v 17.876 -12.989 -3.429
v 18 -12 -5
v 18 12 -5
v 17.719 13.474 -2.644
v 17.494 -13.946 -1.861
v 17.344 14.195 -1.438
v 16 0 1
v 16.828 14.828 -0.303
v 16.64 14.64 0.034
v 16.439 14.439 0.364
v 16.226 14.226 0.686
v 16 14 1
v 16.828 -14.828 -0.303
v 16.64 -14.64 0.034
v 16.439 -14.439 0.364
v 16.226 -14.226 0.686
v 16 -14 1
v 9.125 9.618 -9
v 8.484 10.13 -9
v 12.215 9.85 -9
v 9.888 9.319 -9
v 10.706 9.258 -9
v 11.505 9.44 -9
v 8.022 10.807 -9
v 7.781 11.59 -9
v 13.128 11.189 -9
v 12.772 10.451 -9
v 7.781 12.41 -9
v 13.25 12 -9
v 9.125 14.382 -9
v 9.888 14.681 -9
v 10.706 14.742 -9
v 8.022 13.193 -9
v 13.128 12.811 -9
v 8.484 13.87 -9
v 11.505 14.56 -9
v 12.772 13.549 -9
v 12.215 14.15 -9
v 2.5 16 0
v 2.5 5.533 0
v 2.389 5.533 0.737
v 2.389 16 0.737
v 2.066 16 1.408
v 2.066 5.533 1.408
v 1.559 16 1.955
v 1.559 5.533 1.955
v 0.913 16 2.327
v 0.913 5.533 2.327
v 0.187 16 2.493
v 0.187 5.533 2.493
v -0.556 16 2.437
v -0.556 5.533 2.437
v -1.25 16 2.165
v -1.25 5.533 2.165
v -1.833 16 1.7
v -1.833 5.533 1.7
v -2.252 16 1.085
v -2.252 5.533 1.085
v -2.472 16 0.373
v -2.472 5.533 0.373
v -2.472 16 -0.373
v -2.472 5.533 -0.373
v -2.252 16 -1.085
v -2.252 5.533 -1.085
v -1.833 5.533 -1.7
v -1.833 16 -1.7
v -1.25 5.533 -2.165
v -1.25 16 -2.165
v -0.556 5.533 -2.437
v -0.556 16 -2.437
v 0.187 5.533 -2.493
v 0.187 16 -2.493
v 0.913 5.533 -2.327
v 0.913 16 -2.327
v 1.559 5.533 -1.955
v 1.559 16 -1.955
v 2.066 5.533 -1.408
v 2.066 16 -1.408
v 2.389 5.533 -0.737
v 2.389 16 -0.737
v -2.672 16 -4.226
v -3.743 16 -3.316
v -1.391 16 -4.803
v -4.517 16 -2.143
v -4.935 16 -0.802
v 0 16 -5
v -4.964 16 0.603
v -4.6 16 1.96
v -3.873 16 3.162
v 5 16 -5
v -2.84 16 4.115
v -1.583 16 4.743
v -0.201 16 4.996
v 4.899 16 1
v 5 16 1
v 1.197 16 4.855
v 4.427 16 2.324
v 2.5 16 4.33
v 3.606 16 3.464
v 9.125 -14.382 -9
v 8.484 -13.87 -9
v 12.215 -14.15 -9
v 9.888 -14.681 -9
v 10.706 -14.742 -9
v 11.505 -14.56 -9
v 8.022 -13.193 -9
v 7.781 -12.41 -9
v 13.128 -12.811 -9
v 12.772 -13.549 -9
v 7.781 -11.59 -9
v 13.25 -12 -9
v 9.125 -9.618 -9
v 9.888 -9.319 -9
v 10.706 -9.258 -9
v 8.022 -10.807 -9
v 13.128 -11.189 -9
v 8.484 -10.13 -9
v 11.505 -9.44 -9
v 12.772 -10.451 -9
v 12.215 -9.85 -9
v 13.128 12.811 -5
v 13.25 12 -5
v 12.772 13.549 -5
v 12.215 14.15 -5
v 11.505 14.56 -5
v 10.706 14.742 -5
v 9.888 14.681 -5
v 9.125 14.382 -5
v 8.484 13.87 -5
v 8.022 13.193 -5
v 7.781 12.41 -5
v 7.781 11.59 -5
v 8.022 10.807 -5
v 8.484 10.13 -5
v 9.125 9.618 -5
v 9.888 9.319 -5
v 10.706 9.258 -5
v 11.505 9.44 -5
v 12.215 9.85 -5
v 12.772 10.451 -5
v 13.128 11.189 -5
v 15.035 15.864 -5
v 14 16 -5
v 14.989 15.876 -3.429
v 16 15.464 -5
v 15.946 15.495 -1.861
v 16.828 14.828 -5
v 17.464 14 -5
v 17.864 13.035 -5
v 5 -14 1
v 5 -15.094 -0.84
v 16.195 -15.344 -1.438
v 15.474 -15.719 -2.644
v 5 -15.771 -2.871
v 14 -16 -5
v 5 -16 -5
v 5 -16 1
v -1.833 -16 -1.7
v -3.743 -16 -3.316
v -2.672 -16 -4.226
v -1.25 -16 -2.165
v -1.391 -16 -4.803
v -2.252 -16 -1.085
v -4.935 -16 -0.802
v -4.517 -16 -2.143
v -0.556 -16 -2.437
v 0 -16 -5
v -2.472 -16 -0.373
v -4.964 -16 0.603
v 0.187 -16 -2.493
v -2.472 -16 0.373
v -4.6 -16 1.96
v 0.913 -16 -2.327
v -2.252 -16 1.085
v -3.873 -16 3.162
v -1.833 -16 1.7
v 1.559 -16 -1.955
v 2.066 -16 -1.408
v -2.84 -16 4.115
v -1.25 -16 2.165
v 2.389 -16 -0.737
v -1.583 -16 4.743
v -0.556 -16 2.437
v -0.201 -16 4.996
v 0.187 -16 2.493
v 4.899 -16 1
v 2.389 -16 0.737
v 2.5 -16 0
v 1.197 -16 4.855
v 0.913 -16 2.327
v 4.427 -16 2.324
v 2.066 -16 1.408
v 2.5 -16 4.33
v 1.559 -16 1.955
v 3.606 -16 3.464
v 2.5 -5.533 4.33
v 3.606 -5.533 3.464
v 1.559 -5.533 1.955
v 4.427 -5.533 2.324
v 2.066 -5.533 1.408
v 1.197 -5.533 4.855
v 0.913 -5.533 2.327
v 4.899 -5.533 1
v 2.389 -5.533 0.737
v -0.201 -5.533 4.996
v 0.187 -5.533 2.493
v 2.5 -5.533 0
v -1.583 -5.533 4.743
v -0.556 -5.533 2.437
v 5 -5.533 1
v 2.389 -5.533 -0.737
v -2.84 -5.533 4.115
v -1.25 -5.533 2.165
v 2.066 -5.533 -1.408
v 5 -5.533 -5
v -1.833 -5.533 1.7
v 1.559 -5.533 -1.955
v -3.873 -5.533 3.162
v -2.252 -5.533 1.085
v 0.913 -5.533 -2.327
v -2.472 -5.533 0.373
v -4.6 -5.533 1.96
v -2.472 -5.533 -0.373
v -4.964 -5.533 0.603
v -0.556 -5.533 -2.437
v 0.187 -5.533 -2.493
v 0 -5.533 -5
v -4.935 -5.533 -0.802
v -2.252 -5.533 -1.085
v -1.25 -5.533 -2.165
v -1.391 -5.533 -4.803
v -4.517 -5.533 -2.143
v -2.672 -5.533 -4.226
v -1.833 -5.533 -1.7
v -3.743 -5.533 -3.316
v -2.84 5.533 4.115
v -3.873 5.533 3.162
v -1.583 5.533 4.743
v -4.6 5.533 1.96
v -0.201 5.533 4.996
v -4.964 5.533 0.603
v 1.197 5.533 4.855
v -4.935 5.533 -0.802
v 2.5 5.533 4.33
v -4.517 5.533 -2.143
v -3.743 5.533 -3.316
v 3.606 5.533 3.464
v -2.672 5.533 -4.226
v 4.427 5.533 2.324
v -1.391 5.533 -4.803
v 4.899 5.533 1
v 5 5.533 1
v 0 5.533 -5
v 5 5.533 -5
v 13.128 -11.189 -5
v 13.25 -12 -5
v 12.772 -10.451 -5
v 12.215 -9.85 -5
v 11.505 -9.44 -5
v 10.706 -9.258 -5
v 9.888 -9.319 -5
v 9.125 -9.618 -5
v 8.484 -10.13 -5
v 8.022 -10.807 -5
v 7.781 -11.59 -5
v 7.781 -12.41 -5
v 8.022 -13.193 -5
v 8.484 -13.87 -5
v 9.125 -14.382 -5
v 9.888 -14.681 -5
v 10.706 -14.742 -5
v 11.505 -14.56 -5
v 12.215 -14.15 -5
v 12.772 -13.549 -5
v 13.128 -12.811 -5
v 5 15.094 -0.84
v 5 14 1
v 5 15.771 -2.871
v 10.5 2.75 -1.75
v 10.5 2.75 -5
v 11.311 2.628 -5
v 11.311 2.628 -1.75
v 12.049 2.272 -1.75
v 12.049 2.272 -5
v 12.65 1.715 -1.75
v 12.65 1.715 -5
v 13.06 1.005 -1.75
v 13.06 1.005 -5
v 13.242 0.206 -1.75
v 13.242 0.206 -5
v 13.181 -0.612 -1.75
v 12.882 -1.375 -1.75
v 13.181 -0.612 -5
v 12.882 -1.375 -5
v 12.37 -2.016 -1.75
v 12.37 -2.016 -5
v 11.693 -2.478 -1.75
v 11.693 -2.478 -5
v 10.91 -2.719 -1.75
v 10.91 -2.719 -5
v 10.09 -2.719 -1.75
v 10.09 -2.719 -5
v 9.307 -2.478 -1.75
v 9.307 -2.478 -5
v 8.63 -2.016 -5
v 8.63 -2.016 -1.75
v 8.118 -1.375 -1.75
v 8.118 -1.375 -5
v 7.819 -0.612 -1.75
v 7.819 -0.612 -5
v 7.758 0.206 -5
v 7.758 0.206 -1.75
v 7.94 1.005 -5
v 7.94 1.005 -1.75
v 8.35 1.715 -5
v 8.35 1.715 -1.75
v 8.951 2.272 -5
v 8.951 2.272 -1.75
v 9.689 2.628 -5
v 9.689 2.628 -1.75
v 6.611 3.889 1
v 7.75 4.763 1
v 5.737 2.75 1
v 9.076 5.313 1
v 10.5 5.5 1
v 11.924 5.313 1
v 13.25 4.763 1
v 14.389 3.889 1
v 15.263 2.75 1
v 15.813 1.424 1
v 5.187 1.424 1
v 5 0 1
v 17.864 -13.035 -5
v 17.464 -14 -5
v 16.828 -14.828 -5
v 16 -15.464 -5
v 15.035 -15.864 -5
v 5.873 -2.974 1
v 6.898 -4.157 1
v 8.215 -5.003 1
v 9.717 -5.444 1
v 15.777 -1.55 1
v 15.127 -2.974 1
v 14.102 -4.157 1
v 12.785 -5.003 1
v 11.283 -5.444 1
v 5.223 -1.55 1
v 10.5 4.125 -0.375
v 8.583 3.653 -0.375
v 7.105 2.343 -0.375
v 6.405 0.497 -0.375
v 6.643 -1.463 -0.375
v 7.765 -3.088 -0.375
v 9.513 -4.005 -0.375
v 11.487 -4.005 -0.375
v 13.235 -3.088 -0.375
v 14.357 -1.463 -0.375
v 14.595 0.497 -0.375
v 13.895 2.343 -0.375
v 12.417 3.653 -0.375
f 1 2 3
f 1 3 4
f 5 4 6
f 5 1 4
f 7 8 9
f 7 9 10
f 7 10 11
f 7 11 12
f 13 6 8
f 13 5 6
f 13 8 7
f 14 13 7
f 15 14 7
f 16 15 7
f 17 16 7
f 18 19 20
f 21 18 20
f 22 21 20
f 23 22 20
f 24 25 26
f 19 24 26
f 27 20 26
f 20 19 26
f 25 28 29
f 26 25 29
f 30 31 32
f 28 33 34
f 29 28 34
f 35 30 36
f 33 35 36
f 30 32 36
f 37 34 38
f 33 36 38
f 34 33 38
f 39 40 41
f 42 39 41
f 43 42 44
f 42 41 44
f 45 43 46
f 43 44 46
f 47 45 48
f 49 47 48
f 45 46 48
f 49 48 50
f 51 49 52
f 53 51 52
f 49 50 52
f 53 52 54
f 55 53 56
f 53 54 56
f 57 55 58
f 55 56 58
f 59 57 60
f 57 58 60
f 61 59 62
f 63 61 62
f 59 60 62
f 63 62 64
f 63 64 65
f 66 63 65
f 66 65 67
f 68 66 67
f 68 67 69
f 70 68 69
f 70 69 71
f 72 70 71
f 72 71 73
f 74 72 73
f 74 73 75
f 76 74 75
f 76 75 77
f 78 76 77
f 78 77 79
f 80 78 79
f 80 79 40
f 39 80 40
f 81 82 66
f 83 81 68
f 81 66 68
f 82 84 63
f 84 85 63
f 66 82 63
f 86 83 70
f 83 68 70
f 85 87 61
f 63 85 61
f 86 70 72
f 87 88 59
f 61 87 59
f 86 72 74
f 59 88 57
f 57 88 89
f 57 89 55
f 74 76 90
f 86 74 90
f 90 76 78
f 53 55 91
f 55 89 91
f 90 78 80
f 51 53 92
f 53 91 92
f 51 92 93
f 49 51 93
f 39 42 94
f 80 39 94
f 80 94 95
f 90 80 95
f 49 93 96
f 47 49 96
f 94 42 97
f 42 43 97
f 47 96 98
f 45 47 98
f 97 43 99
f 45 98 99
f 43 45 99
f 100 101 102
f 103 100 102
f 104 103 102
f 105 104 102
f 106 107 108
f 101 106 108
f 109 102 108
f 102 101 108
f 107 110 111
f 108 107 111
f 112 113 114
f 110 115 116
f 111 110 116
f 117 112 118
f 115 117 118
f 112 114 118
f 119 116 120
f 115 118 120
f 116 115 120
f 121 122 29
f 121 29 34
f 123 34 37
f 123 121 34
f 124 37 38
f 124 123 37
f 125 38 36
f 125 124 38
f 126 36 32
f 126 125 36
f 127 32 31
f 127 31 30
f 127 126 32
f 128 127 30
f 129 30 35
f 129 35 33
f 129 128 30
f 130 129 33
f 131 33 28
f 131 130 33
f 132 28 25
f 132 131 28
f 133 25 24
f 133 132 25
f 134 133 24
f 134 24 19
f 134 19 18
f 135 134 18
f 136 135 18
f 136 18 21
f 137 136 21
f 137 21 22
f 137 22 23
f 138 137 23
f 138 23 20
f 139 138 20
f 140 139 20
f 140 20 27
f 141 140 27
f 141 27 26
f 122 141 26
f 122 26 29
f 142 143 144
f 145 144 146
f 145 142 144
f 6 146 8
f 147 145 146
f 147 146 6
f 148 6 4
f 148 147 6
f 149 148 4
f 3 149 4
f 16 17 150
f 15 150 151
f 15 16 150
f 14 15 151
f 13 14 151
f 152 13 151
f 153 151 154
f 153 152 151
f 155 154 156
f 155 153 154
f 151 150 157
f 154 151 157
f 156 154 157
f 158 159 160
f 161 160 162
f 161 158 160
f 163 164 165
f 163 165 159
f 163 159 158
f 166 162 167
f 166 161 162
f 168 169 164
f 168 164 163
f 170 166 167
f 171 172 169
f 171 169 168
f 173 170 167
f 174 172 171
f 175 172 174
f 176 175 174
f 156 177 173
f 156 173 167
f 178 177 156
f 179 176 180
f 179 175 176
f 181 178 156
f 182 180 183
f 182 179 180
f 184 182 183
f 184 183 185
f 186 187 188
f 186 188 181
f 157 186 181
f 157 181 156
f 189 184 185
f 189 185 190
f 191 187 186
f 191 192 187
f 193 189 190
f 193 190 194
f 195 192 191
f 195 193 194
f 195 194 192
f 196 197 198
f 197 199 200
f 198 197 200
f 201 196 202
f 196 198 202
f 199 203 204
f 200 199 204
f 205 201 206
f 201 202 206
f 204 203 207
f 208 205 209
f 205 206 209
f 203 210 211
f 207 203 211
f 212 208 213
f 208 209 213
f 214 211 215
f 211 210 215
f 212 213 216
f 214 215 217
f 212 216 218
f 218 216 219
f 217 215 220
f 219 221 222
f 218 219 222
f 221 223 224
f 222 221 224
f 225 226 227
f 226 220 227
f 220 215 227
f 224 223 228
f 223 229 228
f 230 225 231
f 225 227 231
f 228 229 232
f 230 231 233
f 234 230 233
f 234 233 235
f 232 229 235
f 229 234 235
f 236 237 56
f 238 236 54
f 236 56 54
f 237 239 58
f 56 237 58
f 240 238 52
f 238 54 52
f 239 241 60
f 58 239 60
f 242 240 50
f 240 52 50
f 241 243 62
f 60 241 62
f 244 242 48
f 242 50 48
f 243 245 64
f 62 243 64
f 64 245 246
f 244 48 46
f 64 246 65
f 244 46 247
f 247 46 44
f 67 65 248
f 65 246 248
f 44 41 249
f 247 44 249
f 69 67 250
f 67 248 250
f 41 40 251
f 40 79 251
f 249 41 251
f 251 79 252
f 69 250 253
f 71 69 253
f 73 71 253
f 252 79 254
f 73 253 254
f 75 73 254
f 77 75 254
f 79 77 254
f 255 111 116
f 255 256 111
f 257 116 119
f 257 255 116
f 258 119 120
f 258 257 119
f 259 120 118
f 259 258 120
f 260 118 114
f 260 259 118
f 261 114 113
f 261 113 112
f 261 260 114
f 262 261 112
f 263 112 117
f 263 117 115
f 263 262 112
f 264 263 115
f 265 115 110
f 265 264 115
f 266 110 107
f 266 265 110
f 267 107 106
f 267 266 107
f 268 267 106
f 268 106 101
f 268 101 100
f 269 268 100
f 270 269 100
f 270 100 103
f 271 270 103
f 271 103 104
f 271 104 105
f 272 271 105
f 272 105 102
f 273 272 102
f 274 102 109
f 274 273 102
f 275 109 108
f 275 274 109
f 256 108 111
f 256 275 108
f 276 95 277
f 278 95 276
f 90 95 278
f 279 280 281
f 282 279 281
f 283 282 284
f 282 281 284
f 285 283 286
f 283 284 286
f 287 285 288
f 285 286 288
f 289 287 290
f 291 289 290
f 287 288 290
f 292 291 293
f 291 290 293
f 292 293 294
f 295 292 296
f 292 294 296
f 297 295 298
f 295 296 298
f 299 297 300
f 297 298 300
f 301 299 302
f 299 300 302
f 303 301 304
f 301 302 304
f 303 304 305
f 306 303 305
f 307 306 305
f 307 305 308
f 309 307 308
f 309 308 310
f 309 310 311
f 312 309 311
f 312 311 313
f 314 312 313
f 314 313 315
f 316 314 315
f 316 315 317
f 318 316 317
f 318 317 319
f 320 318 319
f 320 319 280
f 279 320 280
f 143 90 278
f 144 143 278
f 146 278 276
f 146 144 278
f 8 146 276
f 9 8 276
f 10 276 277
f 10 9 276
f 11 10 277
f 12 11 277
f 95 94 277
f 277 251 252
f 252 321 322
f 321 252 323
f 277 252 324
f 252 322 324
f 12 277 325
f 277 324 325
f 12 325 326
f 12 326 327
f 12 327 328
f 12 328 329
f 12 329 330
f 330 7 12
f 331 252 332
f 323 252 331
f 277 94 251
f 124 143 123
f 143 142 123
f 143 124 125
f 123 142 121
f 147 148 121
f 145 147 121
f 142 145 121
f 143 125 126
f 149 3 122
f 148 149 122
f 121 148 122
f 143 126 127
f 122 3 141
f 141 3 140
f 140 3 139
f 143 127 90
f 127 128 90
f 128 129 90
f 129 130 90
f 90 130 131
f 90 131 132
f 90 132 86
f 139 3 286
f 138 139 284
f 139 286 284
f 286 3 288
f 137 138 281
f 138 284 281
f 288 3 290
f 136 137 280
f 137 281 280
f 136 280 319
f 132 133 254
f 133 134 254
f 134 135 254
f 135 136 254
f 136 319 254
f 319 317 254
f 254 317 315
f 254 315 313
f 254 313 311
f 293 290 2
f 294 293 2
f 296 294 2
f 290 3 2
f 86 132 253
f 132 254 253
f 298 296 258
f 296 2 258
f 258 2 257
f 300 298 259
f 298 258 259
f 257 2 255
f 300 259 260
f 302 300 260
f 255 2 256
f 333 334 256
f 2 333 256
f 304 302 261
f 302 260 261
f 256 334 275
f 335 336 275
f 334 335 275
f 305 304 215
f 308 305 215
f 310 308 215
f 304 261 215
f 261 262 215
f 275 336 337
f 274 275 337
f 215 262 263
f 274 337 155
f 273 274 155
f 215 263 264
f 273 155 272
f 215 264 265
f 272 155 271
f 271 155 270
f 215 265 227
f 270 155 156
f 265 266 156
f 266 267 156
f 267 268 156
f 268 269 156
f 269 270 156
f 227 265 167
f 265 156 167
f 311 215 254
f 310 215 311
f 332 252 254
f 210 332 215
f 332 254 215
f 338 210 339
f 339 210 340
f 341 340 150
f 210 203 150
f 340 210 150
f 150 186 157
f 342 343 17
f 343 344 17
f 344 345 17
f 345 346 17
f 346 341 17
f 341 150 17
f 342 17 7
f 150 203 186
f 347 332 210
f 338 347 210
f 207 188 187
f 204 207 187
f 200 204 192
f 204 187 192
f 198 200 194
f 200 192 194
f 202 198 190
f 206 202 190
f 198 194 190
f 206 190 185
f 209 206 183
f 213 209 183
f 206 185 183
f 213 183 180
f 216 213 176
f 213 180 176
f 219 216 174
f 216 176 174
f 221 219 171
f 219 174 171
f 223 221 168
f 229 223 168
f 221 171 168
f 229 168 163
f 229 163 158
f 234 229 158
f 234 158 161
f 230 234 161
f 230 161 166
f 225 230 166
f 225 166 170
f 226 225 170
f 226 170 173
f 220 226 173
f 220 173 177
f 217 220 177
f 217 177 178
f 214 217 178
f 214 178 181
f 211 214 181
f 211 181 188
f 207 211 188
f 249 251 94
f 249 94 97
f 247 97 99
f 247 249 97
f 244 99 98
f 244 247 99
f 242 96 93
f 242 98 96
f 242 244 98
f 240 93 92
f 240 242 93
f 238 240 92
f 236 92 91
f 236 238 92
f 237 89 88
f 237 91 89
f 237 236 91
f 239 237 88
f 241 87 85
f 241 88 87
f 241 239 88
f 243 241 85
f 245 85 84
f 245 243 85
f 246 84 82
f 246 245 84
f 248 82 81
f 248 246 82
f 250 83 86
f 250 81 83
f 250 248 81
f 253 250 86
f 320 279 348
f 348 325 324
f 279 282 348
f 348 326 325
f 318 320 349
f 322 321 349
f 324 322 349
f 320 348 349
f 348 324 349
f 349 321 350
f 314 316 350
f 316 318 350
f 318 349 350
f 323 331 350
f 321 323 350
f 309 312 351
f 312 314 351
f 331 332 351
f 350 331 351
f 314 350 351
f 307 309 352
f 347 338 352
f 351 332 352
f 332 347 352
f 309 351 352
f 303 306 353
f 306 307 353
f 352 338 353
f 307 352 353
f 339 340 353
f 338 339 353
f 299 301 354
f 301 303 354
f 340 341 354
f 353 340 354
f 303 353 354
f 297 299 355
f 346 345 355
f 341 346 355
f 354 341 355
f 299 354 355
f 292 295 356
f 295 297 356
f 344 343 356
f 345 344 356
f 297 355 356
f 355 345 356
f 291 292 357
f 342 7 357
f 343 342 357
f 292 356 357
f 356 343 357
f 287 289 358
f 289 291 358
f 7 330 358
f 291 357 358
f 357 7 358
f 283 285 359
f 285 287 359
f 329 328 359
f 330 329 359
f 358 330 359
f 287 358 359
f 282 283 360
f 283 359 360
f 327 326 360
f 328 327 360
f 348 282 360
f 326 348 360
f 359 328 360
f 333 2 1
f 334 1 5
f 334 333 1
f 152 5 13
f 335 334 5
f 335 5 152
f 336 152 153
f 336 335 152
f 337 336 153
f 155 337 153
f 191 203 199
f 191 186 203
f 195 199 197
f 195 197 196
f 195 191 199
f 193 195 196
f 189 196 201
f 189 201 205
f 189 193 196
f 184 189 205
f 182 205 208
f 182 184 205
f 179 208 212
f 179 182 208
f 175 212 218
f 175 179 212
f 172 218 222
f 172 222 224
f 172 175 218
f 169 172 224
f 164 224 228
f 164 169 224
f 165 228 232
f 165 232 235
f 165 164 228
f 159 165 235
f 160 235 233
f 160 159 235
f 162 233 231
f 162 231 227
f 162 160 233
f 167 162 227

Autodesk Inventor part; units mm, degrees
sketch "Sketch_1" plane through (0, 0, 0) normal (0, 0, 1) x (1, 0, 0)
  line L0 (0, -16) -> (0, 16)
  line L1 (0, 16) -> (5, 16)
  line L2 (5, 16) -> (5, -16)
  line L3 (5, -16) -> (0, -16)
  line L4 (0, -16) -> (0, 16)
revolve "Revolution1" add sketch "Sketch_1" angle 360 about axis through (0, -16, 0) along (0, -1, 0)
sketch "Sketch_2" plane through (0, 0, 0) normal (0, 1, 0) x (-1, 0, 0)
  line L0 (0, 1) -> (-16, 1)
  arc A0 (-16, 1) -> (-18, -5) centre (-8, -5) ccw
  line L1 (-18, -5) -> (0, -5)
  line L2 (0, -5) -> (0, 1)
extrude "Extrusion1" add sketch "Sketch_2" along normal mid plane 32
sketch "Sketch_4" plane through (18, 0, 0) normal (1, 0, 0) x (0, 0, -1)
  line L0 (-5, -32) -> (10, -32)
  line L1 (10, -32) -> (10, 32)
  line L2 (10, 32) -> (-5, 32)
  line L3 (-5, 32) -> (-5, -32)
  line L4 (-1, 14) -> (-1, -14)
  arc A0 (-1, -14) -> (5, -16) centre (5, -6) ccw
  line L5 (5, -16) -> (5, 16)
  arc A1 (5, 16) -> (-1, 14) centre (5, 6) ccw
extrude "Extrusion2" cut sketch "Sketch_4" against normal blind 13
sketch "Sketch_6" plane through (0, 0, -5) normal (0, 0, 1) x (1, 0, 0)
  circle A0 centre (10.5, 12) radius 2.75
extrude "Extrusion3" add sketch "Sketch_6" against normal blind 4
sketch "Sketch_5" plane through (0, 0, -5) normal (0, 0, 1) x (1, 0, 0)
  circle A0 centre (10.5, -12) radius 2.75
extrude "Extrusion4" add sketch "Sketch_5" against normal blind 4
sketch "Sketch_7" plane through (10.5, 0, 0) normal (1, 0, 0) x (0, 0, -1)
  line L0 (5, 0) -> (-1, 0)
  line L1 (-1, 0) -> (-1, 5.5)
  line L2 (-1, 5.5) -> (1.75, 2.75)
  line L3 (1.75, 2.75) -> (5, 2.75)
  line L4 (5, 2.75) -> (5, 0)
  line L5 (5, 0) -> (-1, 0)
revolve "Revolution2" cut sketch "Sketch_7" angle 360 about axis through (10.5, 0, -5) along (0, 0, -1)
sketch "Sketch_8" plane through (0, 0, 0) normal (0, 0, 1) x (1, 0, 0)
  line L0 (0, -16) -> (0, 16)
  line L1 (0, 16) -> (2.5, 16)
  line L2 (2.5, 16) -> (2.5, -16)
  line L3 (2.5, -16) -> (0, -16)
  line L4 (0, -16) -> (0, 16)
revolve "Revolution3" cut sketch "Sketch_8" angle 360 about axis through (0, -16, 0) along (0, -1, 0)
sketch "Sketch_3" plane through (0, 0, 0) normal (0, 0, 1) x (1, 0, 0)
  line L0 (-36, -36) -> (36, -36)
  line L1 (36, -36) -> (36, 36)
  line L2 (36, 36) -> (-36, 36)
  line L3 (-36, 36) -> (-36, -36)
  line L4 (-5, -16) -> (14, -16)
  arc A0 (14, -16) -> (18, -12) centre (14, -12) ccw
  line L5 (18, -12) -> (18, 12)
  arc A1 (18, 12) -> (14, 16) centre (14, 12) ccw
  line L6 (14, 16) -> (-5, 16)
  line L7 (-5, 16) -> (-5, 5.5333)
  line L8 (-5, 5.5333) -> (5, 5.5333)
  line L9 (5, 5.5333) -> (5, -5.5333)
  line L10 (5, -5.5333) -> (-5, -5.5333)
  line L11 (-5, -5.5333) -> (-5, -16)
extrude "Extrusion5" cut sketch "Sketch_3" along normal mid plane 10
ref_plane "hhpsjc_r_XY" through (0, 0, 0) normal (0, 1, 0) x (1, 0, 0)
ref_plane "hhpsjc_r_YZ" through (0, 0, 0) normal (1, 0, 0) x (0, 0, -1)
ref_plane "hhpsjc_r_ZX" through (0, 0, 0) normal (0, 0, -1) x (0, 1, 0)
ref_plane "hole2_to_bolt_XY" through (10.5, 0, 1) normal (0, 0, 1) x (1, 0, 0)
ref_plane "hole2_to_bolt_YZ" through (10.5, 0, 1) normal (1, 0, 0) x (0, 1, 0)
ref_plane "hole2_to_bolt_ZX" through (10.5, 0, 1) normal (0, 1, 0) x (0, 0, 1)
ref_plane "nut2_to_bolt_XY" through (10.5, 0, -7) normal (0, 0, 1) x (1, 0, 0)
ref_plane "nut2_to_bolt_YZ" through (10.5, 0, -7) normal (1, 0, 0) x (0, 1, 0)
ref_plane "nut2_to_bolt_ZX" through (10.5, 0, -7) normal (0, 1, 0) x (0, 0, 1)
properties part number "HHPSJC5-r"
